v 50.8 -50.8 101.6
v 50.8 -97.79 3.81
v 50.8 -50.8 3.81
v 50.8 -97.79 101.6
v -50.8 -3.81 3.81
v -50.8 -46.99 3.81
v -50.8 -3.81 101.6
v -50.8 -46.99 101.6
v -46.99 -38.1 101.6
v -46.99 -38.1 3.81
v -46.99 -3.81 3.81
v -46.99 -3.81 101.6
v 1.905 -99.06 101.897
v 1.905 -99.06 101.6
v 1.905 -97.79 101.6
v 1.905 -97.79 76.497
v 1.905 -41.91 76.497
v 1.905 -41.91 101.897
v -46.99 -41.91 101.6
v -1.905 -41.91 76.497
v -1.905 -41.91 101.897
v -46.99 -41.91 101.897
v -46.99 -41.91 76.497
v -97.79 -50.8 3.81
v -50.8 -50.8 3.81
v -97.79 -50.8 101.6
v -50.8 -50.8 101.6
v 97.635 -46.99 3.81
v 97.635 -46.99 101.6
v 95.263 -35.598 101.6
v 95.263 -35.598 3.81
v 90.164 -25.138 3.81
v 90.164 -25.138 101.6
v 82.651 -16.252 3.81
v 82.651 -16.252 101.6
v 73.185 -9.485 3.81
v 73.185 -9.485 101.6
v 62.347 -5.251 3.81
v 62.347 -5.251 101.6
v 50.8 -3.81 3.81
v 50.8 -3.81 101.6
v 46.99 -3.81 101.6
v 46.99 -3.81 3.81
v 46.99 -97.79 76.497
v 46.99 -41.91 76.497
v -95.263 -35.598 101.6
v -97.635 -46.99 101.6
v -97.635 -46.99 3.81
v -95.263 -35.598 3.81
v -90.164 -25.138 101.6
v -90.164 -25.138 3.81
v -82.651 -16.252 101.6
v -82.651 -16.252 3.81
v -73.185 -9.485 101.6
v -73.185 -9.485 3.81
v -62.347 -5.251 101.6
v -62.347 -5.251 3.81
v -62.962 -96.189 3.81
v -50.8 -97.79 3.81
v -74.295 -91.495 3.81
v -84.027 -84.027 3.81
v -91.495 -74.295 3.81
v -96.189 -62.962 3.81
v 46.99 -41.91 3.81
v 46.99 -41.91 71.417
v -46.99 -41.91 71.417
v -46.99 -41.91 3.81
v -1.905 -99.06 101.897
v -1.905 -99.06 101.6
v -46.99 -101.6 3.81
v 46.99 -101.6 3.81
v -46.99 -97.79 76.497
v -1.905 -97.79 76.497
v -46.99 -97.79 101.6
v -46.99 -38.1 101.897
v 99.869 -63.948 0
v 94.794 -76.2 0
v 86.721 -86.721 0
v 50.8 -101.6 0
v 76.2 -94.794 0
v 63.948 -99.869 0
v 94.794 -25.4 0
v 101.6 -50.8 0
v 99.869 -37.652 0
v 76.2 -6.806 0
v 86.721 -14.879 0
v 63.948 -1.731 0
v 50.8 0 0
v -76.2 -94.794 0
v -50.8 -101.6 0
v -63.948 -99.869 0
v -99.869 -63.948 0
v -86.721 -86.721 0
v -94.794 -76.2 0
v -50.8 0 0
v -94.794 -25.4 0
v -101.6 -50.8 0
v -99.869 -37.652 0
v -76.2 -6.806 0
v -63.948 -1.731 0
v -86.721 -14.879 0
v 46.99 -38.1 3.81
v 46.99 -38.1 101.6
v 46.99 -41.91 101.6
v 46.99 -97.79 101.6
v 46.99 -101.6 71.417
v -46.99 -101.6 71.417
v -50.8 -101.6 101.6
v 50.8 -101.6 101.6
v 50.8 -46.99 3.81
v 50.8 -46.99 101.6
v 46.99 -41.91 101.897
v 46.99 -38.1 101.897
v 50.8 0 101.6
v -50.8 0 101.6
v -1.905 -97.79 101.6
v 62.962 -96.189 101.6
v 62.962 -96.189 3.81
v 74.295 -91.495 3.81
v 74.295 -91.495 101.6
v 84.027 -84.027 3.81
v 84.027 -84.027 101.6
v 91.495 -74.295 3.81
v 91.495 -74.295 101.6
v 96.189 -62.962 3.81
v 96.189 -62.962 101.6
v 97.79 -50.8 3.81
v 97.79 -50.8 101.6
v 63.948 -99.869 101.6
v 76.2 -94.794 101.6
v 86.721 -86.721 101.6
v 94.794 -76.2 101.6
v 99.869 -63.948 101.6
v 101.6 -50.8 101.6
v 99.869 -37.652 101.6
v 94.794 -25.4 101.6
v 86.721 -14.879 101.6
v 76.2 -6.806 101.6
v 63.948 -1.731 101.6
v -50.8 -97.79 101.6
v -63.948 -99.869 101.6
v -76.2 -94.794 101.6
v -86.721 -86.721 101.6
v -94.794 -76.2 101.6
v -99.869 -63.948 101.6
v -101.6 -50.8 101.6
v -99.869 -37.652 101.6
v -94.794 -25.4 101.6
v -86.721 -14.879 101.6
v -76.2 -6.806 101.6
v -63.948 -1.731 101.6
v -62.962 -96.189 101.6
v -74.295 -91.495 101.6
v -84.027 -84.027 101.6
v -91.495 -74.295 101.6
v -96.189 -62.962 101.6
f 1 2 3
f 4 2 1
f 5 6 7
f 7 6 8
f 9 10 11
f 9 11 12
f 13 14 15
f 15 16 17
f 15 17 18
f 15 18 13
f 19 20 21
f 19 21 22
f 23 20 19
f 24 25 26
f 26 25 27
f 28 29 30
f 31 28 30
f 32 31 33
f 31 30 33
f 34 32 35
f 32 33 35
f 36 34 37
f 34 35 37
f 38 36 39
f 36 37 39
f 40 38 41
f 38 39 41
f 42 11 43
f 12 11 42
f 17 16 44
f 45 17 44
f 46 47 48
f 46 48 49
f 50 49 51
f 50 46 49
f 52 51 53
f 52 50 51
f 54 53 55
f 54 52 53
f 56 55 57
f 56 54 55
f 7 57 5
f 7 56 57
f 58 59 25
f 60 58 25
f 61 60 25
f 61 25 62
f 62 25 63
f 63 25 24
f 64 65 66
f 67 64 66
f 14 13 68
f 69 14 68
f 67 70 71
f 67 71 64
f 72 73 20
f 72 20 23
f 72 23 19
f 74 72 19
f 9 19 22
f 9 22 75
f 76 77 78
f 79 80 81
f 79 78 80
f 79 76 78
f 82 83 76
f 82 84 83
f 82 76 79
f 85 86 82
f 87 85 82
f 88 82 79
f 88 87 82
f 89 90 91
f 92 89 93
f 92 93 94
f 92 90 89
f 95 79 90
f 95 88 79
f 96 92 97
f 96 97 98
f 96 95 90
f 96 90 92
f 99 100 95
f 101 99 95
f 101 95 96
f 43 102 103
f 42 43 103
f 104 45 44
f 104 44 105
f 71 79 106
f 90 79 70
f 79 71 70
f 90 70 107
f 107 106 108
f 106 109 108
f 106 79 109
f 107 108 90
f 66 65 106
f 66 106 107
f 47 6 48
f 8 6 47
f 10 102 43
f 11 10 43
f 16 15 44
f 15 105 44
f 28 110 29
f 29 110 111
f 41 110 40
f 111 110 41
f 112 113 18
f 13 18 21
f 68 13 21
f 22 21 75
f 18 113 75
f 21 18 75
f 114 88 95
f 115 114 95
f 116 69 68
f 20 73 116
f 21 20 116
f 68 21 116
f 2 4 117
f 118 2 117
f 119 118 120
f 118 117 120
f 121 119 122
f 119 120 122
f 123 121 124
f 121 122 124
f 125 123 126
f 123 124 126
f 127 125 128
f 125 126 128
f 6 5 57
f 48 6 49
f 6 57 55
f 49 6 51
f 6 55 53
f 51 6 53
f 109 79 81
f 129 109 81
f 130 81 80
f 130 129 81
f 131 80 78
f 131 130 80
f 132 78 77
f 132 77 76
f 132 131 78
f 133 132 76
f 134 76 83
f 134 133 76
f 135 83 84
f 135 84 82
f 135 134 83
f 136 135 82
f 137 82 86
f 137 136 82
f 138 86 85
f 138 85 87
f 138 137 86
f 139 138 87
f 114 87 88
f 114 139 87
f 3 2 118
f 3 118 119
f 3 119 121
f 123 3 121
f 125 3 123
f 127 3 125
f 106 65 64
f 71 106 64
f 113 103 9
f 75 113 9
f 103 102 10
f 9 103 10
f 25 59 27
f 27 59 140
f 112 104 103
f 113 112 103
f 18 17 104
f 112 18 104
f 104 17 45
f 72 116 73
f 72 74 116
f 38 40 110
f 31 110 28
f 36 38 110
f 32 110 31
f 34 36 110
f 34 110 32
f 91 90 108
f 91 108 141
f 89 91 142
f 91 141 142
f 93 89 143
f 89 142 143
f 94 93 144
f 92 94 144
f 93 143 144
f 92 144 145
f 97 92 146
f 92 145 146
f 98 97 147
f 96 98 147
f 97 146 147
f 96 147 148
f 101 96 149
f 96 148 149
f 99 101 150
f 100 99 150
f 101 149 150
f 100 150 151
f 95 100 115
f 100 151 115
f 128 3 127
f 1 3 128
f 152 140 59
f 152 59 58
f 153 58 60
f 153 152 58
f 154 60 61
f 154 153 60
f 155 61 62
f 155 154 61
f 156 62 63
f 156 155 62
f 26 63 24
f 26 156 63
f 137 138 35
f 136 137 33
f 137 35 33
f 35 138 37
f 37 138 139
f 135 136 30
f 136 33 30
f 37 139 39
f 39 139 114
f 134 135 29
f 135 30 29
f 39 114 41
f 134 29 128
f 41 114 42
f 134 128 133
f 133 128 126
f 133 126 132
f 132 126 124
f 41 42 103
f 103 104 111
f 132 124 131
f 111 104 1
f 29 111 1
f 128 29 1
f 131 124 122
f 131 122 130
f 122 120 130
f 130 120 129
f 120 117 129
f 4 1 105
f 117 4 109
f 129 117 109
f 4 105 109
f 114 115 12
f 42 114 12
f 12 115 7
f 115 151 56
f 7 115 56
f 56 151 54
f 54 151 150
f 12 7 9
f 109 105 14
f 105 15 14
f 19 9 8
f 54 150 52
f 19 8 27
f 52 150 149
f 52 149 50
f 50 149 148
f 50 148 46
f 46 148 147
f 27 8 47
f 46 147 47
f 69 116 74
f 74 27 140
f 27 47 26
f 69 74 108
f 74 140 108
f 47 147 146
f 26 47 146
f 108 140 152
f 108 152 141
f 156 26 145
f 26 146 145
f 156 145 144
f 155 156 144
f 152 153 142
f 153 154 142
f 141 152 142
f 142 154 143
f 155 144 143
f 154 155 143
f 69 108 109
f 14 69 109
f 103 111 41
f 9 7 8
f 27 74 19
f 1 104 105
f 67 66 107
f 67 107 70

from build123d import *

# Parameters (mm, degrees)
F0_W      = 50.8
F0_H      = 101.6
F1_DEPTH  = 101.6
F4_DEPTH  = 101.6
F5_T      = -3.81
F6_W      = 3.81
F6_H      = 101.6
F7_DEPTH  = 101.6
F8_DEPTH  = 25.4
F9_W      = 50.8
F9_H      = 5.08
F10_DEPTH = 63.5
F11_W     = 46.99
F11_H     = 3.81
F12_DEPTH = 25.4
F13_DEPTH = 101.6
F14_DEPTH = 25.4
F15_W     = 1.905
F15_H     = 25.4
F16_DEPTH = 57.15
F18_W     = 3.81
F18_H     = 97.79
F19_DEPTH = 49.53


with BuildPart() as f1:
    # F0 (on Top) → F1 (new body)
    with BuildSketch(Plane.XY):
        with Locations((25.4, -50.8)):
            Rectangle(F0_W, F0_H)
    extrude(amount=F1_DEPTH)

    # F2 (on face) → F4 (join)
    with BuildSketch(Plane.XY.offset(101.6)):
        with BuildLine():
            Line((50.8, 0), (50.8, -101.6))
            ThreePointArc((50.8, -101.6), (101.6, -50.8), (50.8, 0))
        make_face()
    extrude(amount=-F4_DEPTH)

    # F5
    f5_openings = [f1.faces().sort_by_distance(p)[0] for p in [
        (46.057827, -50.8, 101.6),
    ]]
    offset(amount=F5_T, openings=f5_openings)

    # F6 (on face) → F7 (join)
    with BuildSketch(Plane.XZ.offset(101.6)):
        with Locations((48.895, 50.8)):
            Rectangle(F6_W, F6_H)
    extrude(amount=-F7_DEPTH)

    # F8 (cut): a face of the model
    f8_faces = [f1.faces().sort_by_distance(p)[0] for p in [
        (3.81, -50.8, 52.705),
    ]]
    extrude(f8_faces, amount=-F8_DEPTH, mode=Mode.SUBTRACT)

    # F9 (on face) → F10 (join)
    with BuildSketch(Plane.XZ.offset(101.6)):
        with Locations((25.4, 73.9570113206)):
            Rectangle(F9_W, F9_H)
    extrude(amount=-F10_DEPTH)

    # F11 (on face) → F12 (join)
    with BuildSketch(Plane.XY.offset(76.4970113206)):
        with Locations((23.495, -40.005)):
            Rectangle(F11_W, F11_H)
    extrude(amount=F12_DEPTH)

    # F13 (add): a face of the model
    f13_faces = [f1.faces().sort_by_distance(p)[0] for p in [
        (23.495, -40.005, 101.8970113206),
    ]]
    extrude(f13_faces, amount=-F13_DEPTH)

    # F14 (cut): a face of the model
    f14_faces = [f1.faces().sort_by_distance(p)[0] for p in [
        (23.495, -97.79, 37.6135056603),
    ]]
    extrude(f14_faces, amount=-F14_DEPTH, mode=Mode.SUBTRACT)

    # F15 (on face) → F16 (join)
    with BuildSketch(Plane.XZ.offset(41.91)):
        with Locations((0.9525, 89.1970113206)):
            Rectangle(F15_W, F15_H)
    extrude(amount=F16_DEPTH)

    # F17: F1 across plane


with BuildPart() as f1_1:
    add(f1.part)
    add(f1.part.mirror(Plane.YZ))

    # F18 (on face) → F19 (join)
    with BuildSketch(Plane(origin=(-50.8, 0, 0), x_dir=(0, -1, 0), z_dir=(-1, 0, 0))):
        with Locations((48.895, 52.705)):
            Rectangle(F18_W, F18_H)
    extrude(amount=F19_DEPTH)

    # F20: F1 across plane


with BuildPart() as f1_2:
    add(f1_1.part)
    add(f1_1.part.mirror(Plane.YZ))


solid = f1_2.part
